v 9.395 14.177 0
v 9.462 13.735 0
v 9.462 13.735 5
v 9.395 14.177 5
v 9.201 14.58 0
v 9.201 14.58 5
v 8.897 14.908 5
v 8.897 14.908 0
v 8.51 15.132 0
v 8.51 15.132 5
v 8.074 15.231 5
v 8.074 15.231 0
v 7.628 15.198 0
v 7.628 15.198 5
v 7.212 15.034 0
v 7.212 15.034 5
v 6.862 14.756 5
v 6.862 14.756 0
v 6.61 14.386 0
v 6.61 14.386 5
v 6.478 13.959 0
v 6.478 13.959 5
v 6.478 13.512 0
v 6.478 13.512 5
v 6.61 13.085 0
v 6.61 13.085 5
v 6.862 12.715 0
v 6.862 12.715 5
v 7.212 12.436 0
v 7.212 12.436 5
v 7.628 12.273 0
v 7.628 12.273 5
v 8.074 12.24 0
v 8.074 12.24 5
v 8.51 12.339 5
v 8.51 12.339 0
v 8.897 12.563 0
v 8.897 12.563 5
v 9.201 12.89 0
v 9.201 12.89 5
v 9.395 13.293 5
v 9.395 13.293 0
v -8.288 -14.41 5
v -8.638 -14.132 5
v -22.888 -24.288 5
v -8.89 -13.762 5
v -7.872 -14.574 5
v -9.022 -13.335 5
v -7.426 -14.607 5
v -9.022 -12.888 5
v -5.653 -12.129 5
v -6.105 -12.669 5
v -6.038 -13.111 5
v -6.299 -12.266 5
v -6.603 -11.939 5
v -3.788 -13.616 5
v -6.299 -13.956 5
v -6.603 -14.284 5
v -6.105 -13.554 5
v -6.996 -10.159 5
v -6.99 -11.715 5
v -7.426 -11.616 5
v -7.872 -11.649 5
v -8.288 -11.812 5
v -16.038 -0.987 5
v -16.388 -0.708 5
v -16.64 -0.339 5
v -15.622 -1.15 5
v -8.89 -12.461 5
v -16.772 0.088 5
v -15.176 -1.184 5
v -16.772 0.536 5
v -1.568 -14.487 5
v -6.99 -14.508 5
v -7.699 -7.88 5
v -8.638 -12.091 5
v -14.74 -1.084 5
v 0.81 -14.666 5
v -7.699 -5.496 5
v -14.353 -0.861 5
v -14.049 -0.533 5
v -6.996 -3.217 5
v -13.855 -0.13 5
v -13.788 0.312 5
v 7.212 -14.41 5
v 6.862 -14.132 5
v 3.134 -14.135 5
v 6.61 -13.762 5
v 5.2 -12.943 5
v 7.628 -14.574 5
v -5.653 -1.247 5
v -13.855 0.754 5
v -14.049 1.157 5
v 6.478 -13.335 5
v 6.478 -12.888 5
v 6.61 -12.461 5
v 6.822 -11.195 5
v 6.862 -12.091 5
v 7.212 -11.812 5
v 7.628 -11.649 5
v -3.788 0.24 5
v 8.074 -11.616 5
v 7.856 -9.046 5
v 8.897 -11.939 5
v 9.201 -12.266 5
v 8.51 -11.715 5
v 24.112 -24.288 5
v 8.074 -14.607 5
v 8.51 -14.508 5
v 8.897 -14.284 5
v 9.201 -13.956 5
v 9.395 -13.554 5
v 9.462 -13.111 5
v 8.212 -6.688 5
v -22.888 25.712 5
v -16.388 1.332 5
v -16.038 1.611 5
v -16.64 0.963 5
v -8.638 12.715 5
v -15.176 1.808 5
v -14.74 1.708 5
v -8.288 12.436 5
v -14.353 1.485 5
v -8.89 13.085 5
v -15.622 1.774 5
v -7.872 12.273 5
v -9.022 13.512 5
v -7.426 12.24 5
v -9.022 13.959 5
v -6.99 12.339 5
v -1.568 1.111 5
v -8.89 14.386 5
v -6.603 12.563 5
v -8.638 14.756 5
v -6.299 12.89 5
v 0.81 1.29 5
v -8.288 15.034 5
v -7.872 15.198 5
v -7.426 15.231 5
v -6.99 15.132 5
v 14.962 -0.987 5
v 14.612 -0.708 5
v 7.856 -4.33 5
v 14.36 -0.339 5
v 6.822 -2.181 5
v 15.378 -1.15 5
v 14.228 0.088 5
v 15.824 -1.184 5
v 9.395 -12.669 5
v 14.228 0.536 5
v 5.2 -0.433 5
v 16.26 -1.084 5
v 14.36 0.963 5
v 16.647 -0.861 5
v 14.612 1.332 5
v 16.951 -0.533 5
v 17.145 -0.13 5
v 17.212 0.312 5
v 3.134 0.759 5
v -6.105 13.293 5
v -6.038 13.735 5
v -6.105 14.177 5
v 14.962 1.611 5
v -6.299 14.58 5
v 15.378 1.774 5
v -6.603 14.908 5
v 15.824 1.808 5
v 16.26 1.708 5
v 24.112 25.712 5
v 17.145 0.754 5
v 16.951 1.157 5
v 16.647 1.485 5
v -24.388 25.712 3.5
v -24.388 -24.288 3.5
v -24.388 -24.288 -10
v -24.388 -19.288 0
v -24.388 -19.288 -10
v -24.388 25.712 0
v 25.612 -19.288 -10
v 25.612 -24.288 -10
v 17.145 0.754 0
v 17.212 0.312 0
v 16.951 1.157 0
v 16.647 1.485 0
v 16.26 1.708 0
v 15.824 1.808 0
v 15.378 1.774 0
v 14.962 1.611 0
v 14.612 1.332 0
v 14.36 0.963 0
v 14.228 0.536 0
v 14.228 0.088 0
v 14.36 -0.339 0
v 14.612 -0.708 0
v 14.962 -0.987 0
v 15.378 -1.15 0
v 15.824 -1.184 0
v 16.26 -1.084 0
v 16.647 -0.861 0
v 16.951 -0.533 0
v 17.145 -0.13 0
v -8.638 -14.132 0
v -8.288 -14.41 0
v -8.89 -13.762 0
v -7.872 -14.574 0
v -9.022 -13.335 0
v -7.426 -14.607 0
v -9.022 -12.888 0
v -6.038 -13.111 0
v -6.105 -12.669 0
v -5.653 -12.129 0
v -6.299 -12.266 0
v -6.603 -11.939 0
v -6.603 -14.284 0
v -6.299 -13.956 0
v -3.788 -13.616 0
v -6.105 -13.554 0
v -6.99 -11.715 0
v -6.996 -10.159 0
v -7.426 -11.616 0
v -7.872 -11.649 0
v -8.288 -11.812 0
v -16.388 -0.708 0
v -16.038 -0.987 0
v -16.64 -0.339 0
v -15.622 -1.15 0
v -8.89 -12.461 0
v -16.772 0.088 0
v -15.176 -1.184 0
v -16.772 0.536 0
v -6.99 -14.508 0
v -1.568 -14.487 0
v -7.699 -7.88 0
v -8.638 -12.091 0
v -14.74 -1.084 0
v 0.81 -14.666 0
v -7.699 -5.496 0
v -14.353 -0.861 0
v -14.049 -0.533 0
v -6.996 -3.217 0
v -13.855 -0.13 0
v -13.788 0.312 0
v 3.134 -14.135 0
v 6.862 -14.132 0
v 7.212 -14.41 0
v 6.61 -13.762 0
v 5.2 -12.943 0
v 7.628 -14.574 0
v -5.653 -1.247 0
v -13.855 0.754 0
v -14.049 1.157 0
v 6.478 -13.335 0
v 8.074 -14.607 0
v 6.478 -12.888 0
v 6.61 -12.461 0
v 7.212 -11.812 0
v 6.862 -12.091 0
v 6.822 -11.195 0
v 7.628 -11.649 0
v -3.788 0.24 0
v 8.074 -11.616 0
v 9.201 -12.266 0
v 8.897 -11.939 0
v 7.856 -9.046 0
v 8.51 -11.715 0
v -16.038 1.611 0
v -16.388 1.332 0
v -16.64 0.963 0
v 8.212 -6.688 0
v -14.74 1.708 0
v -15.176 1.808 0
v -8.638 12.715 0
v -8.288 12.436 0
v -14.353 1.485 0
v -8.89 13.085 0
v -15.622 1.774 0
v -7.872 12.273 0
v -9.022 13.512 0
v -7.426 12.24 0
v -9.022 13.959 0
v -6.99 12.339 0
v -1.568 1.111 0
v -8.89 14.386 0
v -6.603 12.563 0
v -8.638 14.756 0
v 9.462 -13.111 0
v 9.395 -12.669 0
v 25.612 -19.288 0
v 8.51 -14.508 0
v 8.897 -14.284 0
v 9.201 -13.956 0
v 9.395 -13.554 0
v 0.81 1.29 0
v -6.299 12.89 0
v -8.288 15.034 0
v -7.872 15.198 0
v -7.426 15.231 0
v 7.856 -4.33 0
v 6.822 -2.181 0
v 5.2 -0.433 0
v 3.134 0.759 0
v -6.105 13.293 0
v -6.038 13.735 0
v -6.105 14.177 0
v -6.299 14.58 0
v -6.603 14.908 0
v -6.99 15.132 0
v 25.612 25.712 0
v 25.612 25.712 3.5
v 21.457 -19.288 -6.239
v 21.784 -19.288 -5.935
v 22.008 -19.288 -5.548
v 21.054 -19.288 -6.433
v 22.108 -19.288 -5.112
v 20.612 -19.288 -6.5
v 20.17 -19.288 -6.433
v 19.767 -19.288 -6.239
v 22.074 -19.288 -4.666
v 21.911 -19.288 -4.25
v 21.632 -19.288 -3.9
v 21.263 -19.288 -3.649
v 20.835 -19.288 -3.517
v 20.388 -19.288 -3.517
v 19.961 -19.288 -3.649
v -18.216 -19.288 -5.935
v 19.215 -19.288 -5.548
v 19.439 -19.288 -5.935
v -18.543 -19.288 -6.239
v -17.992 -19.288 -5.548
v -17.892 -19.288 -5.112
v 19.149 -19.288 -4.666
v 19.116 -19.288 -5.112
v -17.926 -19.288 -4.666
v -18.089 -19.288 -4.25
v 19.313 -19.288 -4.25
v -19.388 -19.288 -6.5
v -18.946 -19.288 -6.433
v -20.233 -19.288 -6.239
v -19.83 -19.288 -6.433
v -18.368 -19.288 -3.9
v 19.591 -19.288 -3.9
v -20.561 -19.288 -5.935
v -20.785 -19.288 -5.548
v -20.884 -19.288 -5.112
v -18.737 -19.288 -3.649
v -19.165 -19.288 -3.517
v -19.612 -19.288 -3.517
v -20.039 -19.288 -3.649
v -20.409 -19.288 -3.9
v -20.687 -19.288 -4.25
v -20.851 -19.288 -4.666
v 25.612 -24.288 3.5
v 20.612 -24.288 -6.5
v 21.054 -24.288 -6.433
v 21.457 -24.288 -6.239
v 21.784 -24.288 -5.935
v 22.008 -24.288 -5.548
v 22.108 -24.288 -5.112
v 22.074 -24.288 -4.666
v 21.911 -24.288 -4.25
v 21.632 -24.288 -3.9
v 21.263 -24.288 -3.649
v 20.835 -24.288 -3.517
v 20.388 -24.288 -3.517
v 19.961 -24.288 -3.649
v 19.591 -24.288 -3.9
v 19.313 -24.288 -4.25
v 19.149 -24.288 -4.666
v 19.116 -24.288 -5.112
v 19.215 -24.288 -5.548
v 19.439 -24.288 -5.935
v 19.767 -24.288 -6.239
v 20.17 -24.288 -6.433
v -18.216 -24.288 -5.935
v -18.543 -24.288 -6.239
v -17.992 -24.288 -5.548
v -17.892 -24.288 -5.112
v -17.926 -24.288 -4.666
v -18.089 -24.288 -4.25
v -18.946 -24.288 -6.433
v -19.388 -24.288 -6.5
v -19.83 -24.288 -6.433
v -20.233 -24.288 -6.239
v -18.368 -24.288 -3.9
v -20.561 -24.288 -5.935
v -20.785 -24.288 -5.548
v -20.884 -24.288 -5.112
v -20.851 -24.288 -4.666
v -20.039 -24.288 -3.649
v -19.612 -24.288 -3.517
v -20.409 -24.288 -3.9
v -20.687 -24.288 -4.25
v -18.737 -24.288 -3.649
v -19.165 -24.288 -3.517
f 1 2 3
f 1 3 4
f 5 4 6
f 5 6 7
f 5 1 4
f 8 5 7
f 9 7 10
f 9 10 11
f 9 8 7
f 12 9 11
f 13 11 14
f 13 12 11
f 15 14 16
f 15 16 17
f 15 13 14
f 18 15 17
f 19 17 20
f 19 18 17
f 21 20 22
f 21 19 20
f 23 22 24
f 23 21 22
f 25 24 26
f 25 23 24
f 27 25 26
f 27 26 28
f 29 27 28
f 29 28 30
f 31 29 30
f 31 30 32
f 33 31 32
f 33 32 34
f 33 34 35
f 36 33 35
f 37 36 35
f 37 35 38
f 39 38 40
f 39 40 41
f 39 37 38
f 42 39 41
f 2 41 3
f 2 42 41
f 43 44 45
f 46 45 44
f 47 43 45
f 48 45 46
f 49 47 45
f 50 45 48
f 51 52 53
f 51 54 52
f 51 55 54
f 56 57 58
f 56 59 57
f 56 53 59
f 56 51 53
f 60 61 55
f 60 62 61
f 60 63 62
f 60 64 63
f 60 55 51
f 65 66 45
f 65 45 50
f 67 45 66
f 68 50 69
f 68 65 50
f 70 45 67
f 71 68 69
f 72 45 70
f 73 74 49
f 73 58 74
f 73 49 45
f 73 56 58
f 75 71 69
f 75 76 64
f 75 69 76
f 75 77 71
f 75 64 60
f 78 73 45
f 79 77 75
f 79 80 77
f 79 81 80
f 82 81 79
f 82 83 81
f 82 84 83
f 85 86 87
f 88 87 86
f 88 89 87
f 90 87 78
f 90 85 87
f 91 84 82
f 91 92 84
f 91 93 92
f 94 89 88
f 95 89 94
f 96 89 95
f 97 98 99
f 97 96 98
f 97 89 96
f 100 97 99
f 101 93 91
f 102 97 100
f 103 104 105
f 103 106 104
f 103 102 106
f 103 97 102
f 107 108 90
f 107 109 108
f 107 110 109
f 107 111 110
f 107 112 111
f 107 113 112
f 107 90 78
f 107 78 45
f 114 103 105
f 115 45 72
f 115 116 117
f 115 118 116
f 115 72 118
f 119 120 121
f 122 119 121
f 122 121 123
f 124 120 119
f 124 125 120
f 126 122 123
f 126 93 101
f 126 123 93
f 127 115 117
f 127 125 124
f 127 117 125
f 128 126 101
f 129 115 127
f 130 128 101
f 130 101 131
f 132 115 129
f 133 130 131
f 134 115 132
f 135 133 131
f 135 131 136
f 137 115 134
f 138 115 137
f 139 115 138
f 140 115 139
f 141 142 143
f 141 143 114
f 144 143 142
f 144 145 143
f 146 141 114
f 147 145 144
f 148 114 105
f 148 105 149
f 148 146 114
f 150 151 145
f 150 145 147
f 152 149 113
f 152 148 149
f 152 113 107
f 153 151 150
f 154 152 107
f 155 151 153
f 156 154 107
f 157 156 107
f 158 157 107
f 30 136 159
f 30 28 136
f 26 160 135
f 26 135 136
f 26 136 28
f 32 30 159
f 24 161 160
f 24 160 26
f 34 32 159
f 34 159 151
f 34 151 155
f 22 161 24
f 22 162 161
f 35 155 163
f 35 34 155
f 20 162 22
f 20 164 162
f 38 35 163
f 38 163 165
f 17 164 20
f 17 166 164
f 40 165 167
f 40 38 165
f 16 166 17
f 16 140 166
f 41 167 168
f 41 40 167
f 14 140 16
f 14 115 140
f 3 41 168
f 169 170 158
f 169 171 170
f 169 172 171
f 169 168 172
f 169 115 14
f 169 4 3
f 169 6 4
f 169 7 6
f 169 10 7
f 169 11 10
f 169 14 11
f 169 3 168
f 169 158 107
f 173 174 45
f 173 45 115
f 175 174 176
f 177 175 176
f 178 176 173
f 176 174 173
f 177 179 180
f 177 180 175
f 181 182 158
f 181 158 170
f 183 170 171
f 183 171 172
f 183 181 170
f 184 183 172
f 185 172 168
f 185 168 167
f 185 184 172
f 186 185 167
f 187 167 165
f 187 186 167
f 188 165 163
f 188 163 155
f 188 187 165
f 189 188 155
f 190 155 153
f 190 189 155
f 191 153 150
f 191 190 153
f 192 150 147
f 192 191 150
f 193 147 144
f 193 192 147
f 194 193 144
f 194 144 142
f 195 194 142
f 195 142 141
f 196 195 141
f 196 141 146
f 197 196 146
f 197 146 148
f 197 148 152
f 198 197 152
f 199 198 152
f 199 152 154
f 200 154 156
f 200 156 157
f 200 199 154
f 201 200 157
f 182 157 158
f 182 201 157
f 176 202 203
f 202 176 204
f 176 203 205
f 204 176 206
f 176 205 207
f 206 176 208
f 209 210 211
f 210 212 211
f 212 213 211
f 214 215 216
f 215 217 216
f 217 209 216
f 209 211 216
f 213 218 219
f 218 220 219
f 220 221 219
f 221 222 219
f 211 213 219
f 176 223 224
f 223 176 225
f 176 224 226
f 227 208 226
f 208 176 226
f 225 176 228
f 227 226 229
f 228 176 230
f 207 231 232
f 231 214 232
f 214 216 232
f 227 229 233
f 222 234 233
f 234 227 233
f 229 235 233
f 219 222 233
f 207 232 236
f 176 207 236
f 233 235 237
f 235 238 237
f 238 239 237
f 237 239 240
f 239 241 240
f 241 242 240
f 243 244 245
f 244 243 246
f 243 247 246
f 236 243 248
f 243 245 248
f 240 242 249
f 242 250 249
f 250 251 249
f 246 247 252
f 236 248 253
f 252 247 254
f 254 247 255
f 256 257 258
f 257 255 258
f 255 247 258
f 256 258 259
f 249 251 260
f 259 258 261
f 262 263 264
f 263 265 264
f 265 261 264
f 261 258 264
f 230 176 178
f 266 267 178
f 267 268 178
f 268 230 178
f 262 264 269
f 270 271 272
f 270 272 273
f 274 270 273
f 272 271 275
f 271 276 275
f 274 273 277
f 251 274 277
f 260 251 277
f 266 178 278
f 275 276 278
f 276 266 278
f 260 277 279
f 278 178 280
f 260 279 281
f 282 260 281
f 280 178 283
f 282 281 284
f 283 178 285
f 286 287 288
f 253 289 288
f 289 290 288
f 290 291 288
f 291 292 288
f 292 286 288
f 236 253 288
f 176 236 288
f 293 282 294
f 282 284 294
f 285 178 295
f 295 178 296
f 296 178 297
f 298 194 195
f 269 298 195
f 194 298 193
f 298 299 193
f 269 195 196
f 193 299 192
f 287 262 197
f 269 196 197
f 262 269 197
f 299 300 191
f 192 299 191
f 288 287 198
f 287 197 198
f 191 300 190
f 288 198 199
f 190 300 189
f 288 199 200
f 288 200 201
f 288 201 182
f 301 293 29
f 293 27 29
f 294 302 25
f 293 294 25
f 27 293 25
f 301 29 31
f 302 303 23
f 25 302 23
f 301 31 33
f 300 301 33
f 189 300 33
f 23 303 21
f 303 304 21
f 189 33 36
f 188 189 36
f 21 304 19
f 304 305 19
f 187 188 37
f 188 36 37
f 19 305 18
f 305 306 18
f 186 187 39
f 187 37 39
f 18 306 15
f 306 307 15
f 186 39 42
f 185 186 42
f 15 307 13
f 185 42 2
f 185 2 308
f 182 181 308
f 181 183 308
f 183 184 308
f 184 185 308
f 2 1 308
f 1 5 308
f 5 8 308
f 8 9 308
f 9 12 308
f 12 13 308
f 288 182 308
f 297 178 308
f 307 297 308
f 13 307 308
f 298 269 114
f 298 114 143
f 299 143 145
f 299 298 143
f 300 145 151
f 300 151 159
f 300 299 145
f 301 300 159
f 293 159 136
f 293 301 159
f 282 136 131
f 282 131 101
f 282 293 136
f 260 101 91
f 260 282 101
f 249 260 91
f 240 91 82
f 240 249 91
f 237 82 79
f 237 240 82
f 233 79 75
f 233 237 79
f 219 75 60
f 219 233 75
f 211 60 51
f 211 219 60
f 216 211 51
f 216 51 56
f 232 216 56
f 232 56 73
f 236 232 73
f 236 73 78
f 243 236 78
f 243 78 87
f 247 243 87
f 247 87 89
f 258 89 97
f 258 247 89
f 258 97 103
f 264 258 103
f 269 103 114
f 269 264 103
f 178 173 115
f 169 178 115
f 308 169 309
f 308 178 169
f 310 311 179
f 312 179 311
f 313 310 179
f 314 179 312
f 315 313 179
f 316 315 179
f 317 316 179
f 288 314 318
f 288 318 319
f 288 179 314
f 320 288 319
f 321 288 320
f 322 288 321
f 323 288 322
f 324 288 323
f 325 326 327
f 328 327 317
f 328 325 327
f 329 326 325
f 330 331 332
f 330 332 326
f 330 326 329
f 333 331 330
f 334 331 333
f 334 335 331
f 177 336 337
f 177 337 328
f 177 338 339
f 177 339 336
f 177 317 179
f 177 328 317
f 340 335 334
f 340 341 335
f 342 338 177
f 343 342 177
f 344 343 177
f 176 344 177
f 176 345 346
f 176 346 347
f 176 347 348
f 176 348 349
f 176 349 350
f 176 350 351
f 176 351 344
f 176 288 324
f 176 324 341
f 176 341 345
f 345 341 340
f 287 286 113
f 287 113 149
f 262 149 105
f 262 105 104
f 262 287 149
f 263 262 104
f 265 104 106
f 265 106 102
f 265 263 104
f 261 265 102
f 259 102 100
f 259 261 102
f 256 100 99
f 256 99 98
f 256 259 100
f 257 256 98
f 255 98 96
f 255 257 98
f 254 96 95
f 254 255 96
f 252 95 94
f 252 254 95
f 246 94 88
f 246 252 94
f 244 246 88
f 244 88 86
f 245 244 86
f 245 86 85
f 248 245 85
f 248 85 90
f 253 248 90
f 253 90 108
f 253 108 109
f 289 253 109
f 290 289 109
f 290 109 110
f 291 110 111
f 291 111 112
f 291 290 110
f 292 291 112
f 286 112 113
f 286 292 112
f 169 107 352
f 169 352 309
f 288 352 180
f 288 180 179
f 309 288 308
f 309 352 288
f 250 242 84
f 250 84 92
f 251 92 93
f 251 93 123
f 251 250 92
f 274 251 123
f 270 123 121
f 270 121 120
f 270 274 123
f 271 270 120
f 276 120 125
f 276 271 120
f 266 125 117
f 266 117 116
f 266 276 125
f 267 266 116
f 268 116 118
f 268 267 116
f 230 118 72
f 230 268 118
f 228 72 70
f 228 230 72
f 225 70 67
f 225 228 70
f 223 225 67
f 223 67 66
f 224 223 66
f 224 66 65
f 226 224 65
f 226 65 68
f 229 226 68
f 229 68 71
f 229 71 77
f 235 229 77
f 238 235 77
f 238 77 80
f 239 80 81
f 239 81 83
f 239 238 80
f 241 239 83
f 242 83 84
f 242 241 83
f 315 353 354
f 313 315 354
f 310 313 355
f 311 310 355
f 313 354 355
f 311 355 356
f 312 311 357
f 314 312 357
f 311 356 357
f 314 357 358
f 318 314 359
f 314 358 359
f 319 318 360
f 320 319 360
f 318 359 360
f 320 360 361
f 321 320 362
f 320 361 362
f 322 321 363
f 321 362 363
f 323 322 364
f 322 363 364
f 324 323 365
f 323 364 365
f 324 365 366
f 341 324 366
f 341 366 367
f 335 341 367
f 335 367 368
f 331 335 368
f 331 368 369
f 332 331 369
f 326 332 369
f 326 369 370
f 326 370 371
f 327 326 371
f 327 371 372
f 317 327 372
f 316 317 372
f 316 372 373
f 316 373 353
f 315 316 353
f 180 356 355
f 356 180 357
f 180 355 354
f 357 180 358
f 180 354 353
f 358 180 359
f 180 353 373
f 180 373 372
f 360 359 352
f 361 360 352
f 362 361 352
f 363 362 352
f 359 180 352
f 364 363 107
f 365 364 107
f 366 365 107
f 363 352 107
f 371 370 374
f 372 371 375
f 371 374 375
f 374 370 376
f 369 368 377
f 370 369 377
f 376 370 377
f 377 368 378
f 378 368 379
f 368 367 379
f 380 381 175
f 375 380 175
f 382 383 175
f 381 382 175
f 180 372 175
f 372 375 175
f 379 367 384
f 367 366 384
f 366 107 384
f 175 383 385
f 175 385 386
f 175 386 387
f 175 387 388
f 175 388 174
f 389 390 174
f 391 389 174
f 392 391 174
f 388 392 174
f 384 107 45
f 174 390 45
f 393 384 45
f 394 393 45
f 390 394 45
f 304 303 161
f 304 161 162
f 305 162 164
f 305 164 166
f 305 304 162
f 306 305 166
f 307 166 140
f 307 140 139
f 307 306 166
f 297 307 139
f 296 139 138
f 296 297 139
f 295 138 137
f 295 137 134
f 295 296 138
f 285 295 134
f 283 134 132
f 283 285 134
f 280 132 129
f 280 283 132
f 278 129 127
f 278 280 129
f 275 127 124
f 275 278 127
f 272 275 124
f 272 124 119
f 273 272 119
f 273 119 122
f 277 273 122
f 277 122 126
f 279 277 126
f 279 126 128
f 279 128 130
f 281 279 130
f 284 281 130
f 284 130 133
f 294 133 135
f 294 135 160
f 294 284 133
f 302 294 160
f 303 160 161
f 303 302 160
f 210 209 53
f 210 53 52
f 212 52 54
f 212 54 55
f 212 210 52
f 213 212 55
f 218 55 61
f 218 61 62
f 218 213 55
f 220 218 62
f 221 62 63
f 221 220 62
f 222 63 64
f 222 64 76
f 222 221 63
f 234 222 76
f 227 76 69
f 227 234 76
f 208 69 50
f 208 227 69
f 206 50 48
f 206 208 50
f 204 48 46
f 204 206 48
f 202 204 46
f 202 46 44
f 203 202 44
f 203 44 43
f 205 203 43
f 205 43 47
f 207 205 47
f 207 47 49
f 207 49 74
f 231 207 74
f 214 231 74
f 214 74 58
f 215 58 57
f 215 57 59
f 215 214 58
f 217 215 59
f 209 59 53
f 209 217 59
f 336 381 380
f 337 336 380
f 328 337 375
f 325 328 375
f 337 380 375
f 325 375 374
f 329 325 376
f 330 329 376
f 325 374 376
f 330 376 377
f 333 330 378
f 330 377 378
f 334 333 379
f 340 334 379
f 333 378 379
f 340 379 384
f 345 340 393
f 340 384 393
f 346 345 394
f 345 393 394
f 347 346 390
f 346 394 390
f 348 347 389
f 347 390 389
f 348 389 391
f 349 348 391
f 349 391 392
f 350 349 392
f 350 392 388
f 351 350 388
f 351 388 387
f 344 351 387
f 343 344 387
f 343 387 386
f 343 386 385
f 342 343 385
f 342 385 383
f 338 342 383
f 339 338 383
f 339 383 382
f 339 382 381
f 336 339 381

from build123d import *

# Parameters (mm, degrees)
SKETCH2_W           = 50
SKETCH2_H           = 50
SKETCH2_R           = 8
SKETCH2_R_2         = 1.5
BOSS_EXTRUDE1_DEPTH = 5
SKETCH5_W           = 50
SKETCH5_H           = 5
BOSS_EXTRUDE2_DEPTH = 10
SKETCH6_R           = 1.5
CUT_EXTRUDE2_DEPTH  = 10
CHAMFER1_SIZE       = 1.5


with BuildPart() as part:
    # Sketch2 → Boss-Extrude1 (new body)
    with BuildSketch(Plane.XY):
        with Locations((0.61173319, 0.711954255)):
            Rectangle(SKETCH2_W, SKETCH2_H)
        with Locations((0.21173319, -6.688045745)):
            Circle(SKETCH2_R, mode=Mode.SUBTRACT)
        with Locations((-7.53826681, 13.735348013)):
            Circle(SKETCH2_R_2, mode=Mode.SUBTRACT)
        with Locations((7.96173319, 13.735348013)):
            Circle(SKETCH2_R_2, mode=Mode.SUBTRACT)
        with Locations((-15.28826681, 0.311954255)):
            Circle(SKETCH2_R_2, mode=Mode.SUBTRACT)
        with Locations((-7.53826681, -13.111439504)):
            Circle(SKETCH2_R_2, mode=Mode.SUBTRACT)
        with Locations((7.96173319, -13.111439504)):
            Circle(SKETCH2_R_2, mode=Mode.SUBTRACT)
        with Locations((15.71173319, 0.311954255)):
            Circle(SKETCH2_R_2, mode=Mode.SUBTRACT)
    extrude(amount=BOSS_EXTRUDE1_DEPTH)

    # Sketch5 → Boss-Extrude2 (add)
    with BuildSketch(Plane(origin=(0, 0, 0), x_dir=(-1, 0, 0), z_dir=(0, 0, -1))):
        with Locations((-0.61173319, -21.788045745)):
            Rectangle(SKETCH5_W, SKETCH5_H)
    extrude(amount=BOSS_EXTRUDE2_DEPTH)

    # Sketch6 → Cut-Extrude2 (cut)
    with BuildSketch(Plane.XZ.offset(24.288045745)):
        with Locations(Location((-19.38826681, -5, 0), (0, 0, 270))):
            Circle(SKETCH6_R)
        with Locations(Location((20.61173319, -5, 0), (0, 0, 270))):
            Circle(SKETCH6_R)
    extrude(amount=-CUT_EXTRUDE2_DEPTH, mode=Mode.SUBTRACT)

    # Chamfer1
    chamfer1_edges = [part.edges().sort_by_distance(p)[0] for p in [
        (-24.38826681, 0.711954255, 5),
        (25.61173319, 0.711954255, 5),
    ]]
    chamfer(chamfer1_edges, length=CHAMFER1_SIZE)


solid = part.part
